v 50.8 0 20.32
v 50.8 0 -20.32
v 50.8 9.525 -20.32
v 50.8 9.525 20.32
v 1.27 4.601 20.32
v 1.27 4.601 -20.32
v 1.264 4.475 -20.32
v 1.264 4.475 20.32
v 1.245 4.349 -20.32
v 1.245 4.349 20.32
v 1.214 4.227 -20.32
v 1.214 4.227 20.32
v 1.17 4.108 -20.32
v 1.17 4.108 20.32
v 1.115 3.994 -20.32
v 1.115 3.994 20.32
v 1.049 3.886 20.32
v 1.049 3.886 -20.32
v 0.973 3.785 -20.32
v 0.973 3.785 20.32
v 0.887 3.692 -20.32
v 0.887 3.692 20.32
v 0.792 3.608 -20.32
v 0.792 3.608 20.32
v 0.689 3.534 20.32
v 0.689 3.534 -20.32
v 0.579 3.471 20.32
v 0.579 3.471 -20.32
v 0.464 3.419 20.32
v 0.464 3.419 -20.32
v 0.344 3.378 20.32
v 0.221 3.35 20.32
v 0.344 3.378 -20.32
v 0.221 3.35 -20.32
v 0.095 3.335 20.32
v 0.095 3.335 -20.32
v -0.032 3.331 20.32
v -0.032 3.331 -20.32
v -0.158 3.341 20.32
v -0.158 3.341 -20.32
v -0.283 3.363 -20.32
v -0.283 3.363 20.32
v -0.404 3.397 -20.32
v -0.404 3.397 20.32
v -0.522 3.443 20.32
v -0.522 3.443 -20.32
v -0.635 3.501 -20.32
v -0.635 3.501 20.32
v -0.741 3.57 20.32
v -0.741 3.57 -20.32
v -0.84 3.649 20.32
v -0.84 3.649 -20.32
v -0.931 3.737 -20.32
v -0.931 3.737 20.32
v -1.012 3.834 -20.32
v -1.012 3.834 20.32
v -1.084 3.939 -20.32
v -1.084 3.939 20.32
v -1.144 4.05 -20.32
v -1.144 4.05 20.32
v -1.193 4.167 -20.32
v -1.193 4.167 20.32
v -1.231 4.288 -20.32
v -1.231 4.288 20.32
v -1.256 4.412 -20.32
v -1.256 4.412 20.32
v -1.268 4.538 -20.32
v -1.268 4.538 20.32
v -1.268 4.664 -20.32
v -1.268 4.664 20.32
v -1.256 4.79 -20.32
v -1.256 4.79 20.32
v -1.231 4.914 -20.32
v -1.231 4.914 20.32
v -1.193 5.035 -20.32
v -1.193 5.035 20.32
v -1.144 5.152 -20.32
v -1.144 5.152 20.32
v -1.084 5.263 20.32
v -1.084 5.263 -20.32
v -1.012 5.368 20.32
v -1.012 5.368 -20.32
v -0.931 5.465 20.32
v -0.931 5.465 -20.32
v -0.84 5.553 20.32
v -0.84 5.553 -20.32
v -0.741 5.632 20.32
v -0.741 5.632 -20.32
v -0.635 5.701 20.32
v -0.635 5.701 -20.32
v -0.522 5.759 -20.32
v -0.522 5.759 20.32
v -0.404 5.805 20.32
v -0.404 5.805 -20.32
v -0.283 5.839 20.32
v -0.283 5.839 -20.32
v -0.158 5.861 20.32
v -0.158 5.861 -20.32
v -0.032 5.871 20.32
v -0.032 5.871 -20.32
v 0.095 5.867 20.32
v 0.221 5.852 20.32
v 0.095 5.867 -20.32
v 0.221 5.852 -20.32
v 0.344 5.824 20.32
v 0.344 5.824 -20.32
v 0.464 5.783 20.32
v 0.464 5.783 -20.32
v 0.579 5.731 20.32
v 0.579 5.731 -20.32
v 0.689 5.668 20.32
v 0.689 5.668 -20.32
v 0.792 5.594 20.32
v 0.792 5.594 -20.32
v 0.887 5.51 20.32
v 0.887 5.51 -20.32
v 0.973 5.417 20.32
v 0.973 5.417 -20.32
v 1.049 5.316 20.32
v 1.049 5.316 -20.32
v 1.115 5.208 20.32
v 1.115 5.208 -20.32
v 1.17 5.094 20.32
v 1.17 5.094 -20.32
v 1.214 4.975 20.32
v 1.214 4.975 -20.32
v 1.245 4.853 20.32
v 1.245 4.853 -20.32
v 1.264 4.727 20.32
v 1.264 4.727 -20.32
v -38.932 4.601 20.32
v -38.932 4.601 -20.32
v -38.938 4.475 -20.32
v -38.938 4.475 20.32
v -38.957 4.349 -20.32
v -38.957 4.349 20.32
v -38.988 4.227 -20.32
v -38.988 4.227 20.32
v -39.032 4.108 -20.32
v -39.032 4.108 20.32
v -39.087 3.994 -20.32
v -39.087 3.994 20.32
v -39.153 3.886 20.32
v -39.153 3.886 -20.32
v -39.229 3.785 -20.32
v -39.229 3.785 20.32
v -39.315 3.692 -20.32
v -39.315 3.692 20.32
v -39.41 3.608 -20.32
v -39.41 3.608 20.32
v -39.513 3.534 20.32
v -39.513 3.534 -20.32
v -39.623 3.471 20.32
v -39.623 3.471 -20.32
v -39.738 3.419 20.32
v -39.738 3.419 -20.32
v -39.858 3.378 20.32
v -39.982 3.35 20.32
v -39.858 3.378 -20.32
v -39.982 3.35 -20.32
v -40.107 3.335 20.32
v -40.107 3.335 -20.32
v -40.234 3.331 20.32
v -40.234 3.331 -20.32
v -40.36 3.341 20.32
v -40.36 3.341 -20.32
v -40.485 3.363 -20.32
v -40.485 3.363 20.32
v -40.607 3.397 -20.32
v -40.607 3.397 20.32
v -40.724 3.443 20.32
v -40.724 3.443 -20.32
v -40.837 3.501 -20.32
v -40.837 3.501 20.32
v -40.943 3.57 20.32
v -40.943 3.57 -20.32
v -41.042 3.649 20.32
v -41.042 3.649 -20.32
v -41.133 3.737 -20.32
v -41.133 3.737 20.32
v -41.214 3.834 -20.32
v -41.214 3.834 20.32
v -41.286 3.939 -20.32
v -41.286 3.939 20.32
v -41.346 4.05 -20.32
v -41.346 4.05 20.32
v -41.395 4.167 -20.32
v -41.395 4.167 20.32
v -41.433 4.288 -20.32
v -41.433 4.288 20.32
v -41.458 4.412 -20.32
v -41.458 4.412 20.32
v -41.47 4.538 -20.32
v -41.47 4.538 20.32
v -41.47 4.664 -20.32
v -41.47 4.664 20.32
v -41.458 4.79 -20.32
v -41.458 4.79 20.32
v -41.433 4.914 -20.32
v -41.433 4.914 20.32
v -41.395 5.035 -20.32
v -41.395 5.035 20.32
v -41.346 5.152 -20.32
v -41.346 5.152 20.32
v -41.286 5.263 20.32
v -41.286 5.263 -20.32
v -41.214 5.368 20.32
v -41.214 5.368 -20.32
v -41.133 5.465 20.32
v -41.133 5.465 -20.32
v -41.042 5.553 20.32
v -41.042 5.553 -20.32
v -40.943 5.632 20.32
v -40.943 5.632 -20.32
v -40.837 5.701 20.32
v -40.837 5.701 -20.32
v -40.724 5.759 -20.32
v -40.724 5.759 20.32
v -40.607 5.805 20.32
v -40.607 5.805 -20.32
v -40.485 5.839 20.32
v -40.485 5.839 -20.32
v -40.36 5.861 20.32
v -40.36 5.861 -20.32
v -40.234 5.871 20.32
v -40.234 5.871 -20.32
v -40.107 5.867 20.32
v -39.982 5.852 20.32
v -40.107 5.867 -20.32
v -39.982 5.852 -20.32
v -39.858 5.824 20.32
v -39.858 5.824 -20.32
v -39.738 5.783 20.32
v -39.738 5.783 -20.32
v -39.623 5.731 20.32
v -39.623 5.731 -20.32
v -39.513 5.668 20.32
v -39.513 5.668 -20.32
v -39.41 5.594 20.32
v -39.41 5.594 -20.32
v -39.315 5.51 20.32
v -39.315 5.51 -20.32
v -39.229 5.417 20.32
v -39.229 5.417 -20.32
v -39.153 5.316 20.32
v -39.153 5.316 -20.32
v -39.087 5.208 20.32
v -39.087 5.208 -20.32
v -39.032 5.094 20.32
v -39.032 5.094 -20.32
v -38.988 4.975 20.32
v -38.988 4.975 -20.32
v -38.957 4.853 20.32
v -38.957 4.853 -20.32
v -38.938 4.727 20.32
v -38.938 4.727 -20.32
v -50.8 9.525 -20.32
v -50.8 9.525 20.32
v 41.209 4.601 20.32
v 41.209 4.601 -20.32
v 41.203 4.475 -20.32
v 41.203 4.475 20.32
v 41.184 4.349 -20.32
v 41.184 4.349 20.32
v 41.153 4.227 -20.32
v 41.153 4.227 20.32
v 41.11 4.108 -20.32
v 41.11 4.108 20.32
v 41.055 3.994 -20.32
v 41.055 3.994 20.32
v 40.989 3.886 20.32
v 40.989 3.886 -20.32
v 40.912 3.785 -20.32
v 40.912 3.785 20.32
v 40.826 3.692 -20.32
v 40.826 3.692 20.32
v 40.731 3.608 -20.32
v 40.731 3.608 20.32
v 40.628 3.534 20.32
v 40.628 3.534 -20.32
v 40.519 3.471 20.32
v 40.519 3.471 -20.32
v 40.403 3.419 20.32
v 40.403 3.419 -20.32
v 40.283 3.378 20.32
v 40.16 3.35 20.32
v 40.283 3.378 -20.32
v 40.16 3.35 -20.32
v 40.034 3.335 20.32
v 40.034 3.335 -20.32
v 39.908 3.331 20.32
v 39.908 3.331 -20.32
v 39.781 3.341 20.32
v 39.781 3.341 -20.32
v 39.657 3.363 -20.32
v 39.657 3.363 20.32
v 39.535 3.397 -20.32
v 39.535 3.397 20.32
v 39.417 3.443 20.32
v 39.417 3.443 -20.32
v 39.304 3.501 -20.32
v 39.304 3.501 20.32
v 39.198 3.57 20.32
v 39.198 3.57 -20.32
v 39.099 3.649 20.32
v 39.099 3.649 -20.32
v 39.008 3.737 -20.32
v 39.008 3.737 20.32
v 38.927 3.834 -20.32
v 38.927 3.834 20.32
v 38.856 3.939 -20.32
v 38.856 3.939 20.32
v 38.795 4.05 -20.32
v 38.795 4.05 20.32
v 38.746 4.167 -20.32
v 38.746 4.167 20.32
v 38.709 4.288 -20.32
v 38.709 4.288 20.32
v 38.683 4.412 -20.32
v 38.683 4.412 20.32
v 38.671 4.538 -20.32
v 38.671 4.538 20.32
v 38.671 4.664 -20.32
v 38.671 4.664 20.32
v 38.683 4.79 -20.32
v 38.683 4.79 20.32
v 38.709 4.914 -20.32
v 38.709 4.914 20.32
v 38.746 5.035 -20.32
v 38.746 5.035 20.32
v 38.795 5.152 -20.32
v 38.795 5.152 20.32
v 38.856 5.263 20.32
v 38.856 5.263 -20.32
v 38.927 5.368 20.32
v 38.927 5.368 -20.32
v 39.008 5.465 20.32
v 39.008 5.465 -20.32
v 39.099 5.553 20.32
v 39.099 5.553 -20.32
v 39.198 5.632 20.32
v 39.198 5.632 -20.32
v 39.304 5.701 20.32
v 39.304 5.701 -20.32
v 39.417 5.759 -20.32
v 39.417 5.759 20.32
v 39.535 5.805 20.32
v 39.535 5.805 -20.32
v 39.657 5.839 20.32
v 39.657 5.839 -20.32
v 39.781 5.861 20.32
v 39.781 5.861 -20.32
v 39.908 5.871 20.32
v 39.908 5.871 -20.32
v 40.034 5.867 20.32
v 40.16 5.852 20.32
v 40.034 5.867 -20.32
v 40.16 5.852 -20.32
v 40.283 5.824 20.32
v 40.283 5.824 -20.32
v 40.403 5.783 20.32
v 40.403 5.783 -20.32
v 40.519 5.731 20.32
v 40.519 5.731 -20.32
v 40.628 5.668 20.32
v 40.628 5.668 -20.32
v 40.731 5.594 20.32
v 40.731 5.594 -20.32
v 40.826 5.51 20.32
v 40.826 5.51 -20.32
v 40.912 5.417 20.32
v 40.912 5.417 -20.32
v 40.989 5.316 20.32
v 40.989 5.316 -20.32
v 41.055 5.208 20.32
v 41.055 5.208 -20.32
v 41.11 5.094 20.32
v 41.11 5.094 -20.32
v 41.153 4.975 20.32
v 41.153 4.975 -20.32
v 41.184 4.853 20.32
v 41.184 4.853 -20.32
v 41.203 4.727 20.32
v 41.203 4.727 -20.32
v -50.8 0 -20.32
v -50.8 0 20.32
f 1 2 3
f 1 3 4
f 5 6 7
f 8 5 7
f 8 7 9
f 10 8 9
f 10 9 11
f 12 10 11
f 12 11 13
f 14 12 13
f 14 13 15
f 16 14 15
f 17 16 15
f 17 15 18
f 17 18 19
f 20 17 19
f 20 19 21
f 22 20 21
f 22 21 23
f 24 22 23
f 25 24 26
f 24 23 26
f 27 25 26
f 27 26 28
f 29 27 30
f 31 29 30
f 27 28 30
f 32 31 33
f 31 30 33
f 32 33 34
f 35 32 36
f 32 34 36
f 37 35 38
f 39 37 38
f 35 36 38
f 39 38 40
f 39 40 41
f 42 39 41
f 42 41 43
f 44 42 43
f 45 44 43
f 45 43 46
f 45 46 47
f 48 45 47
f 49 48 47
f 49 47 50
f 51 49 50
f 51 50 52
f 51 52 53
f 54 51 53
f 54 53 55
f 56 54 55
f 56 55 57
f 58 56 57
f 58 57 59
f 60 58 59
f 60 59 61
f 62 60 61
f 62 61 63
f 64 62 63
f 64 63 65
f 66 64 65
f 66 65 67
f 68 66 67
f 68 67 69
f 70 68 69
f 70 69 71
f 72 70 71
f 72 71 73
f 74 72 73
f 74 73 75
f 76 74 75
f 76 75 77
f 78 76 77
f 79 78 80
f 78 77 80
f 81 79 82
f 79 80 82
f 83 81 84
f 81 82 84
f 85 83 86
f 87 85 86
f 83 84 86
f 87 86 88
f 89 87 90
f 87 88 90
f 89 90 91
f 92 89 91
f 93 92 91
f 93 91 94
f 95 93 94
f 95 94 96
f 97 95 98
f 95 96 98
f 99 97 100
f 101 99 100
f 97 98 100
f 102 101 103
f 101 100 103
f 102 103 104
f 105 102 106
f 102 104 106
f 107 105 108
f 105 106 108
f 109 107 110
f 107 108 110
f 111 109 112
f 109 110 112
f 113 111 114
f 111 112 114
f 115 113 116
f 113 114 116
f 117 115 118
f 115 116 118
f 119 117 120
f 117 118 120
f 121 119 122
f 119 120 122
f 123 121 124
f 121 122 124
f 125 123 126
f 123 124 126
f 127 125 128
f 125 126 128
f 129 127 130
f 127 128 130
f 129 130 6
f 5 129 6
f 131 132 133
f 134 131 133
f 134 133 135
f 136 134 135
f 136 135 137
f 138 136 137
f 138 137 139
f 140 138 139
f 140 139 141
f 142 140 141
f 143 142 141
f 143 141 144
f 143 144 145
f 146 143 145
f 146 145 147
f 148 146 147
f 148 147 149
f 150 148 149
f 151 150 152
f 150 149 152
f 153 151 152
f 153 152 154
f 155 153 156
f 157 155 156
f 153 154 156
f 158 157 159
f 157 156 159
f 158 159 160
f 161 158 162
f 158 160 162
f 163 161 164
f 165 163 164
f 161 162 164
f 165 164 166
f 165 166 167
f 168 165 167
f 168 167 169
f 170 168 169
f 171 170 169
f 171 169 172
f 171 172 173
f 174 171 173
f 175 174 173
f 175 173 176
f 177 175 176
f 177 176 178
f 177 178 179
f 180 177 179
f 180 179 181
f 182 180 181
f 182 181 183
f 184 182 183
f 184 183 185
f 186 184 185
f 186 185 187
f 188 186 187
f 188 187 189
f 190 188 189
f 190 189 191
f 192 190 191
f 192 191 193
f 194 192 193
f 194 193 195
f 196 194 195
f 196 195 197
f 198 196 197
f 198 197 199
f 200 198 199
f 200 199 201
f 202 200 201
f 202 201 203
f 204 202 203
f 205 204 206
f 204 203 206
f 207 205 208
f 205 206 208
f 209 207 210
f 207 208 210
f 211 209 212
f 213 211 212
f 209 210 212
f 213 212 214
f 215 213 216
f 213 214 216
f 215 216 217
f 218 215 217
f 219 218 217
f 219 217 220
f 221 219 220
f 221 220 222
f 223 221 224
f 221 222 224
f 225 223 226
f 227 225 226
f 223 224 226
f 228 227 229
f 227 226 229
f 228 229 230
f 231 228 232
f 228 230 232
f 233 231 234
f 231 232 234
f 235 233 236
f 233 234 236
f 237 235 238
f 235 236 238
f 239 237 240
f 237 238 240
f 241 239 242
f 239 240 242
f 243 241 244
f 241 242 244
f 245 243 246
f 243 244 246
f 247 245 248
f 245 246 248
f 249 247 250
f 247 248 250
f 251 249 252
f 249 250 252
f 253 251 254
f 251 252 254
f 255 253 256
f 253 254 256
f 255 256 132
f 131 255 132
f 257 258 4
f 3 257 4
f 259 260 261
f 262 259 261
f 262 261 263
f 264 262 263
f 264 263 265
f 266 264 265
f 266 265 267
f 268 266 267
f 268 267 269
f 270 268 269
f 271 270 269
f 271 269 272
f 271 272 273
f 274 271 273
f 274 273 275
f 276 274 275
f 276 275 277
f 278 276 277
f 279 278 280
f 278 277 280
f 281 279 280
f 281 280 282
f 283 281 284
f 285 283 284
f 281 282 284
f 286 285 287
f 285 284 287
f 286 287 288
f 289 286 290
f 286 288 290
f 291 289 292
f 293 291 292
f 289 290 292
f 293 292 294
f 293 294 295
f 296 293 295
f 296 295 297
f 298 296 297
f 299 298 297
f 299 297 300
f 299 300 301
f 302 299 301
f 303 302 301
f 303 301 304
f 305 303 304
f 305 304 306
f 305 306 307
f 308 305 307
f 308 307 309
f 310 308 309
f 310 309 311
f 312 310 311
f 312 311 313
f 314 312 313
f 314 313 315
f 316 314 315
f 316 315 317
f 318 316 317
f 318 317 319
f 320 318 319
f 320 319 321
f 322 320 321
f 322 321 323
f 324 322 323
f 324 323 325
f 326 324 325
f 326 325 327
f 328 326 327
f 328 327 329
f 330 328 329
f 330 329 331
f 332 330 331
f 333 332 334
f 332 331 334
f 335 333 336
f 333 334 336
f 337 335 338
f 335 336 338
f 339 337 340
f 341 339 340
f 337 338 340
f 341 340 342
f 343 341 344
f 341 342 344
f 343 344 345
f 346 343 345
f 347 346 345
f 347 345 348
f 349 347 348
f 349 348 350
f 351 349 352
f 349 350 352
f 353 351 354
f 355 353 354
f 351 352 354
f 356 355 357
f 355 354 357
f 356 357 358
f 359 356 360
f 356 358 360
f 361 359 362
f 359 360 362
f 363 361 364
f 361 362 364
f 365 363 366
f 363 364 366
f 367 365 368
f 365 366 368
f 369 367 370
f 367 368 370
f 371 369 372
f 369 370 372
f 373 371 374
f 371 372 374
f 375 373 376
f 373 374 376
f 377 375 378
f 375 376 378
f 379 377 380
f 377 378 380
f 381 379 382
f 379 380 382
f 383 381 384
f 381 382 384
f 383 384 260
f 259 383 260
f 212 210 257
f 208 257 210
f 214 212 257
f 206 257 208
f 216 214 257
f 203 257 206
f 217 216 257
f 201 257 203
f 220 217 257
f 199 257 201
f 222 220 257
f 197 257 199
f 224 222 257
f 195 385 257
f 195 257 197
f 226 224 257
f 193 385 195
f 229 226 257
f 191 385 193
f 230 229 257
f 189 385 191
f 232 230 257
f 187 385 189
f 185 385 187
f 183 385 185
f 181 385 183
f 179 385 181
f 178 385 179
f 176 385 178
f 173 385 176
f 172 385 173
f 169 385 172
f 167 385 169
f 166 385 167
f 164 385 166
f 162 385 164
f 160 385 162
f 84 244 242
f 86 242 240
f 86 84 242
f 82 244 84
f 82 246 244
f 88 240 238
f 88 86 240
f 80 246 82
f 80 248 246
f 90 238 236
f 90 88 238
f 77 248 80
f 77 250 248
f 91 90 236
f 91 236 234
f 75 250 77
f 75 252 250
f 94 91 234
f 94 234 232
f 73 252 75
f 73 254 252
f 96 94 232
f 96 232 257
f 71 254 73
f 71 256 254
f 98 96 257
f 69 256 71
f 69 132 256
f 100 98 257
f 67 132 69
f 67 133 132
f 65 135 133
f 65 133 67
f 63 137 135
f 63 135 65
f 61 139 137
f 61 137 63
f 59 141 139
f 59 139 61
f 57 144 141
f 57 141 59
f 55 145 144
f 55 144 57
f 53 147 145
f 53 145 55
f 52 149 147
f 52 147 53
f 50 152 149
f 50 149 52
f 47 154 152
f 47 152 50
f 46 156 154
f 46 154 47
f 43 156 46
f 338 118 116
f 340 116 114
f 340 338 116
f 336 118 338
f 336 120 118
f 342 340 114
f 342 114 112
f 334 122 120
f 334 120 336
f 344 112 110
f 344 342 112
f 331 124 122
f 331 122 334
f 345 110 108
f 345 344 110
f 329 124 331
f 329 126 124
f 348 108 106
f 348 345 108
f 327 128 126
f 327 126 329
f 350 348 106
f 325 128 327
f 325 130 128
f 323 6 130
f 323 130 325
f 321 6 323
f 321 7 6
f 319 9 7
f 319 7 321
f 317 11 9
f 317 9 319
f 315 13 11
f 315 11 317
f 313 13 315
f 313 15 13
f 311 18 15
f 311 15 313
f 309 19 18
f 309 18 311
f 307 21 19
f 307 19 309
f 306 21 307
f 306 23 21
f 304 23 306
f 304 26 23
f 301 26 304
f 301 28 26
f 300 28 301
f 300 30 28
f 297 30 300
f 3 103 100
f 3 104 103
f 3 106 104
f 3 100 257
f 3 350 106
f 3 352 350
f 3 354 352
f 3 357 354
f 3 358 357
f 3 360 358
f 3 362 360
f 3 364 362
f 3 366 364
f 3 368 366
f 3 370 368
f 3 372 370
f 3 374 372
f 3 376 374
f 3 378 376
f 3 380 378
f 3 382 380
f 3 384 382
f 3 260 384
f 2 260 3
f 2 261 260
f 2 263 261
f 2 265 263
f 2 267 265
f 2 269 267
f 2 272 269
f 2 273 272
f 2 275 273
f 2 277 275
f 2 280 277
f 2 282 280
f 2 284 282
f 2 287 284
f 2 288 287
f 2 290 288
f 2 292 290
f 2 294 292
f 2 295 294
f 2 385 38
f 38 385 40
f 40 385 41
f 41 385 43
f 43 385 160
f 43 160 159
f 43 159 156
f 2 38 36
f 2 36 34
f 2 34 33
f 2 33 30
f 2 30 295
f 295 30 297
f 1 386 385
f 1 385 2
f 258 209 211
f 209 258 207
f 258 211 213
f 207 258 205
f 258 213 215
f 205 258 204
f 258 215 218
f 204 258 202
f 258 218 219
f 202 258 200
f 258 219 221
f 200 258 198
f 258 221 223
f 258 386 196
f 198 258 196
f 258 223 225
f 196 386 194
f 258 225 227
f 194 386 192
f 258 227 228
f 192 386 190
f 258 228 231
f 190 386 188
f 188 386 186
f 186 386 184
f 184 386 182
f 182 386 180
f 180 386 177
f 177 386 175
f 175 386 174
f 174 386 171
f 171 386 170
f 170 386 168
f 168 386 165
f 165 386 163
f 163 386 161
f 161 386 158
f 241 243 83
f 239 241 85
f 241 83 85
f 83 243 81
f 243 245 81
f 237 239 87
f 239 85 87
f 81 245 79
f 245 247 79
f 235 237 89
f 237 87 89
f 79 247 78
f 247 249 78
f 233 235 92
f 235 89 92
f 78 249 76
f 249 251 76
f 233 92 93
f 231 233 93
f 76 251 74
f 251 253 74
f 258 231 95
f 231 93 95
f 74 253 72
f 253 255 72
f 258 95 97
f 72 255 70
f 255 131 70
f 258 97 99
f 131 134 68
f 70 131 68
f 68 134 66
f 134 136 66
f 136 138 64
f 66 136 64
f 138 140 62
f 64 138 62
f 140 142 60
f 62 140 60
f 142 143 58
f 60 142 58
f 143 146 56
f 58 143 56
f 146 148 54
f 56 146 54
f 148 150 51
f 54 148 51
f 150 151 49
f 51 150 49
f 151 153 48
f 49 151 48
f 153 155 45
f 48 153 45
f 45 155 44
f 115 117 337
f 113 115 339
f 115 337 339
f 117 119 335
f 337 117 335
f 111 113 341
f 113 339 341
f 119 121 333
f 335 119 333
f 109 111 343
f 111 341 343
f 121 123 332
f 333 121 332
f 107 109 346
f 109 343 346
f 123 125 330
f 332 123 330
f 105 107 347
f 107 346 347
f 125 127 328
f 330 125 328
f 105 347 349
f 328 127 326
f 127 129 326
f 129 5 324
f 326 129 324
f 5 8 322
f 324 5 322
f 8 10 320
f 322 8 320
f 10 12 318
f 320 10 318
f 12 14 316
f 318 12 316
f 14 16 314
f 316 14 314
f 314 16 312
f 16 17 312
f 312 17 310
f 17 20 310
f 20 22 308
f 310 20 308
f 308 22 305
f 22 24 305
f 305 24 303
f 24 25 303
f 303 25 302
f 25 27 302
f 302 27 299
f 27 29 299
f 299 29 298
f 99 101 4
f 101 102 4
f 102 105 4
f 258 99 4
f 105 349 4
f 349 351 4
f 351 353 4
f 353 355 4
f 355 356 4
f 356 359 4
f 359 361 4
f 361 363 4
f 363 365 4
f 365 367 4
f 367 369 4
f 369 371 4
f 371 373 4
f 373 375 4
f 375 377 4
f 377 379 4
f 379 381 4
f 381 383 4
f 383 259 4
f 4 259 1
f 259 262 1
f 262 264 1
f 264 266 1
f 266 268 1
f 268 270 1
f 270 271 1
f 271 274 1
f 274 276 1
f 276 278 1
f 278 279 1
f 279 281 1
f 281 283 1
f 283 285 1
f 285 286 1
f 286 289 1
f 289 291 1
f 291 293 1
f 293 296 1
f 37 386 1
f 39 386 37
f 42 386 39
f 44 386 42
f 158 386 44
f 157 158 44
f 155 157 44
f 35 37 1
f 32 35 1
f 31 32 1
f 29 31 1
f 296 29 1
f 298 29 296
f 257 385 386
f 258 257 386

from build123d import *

# Parameters (mm, degrees)
F0_W     = 101.6
F0_H     = 40.64
F1_DEPTH = 9.525
F2_R     = 1.27
F3_DEPTH = 40.641


with BuildPart() as f1:
    # F0 (on Front) → F1 (new body)
    with BuildSketch(Plane.XZ):
        Rectangle(F0_W, F0_H)
    extrude(amount=-F1_DEPTH)

    # F2 (on face) → F3 (cut, through all)
    with BuildSketch(Plane(origin=(0, 0, -20.32), x_dir=(1, 0, 0), z_dir=(0, 0, -1))):
        with Locations((-40.20207, -4.601012)):
            Circle(F2_R)
        with Locations((0, -4.601012)):
            Circle(F2_R)
        with Locations((39.93931, -4.601012)):
            Circle(F2_R)
    extrude(amount=-F3_DEPTH, mode=Mode.SUBTRACT)


solid = f1.part
